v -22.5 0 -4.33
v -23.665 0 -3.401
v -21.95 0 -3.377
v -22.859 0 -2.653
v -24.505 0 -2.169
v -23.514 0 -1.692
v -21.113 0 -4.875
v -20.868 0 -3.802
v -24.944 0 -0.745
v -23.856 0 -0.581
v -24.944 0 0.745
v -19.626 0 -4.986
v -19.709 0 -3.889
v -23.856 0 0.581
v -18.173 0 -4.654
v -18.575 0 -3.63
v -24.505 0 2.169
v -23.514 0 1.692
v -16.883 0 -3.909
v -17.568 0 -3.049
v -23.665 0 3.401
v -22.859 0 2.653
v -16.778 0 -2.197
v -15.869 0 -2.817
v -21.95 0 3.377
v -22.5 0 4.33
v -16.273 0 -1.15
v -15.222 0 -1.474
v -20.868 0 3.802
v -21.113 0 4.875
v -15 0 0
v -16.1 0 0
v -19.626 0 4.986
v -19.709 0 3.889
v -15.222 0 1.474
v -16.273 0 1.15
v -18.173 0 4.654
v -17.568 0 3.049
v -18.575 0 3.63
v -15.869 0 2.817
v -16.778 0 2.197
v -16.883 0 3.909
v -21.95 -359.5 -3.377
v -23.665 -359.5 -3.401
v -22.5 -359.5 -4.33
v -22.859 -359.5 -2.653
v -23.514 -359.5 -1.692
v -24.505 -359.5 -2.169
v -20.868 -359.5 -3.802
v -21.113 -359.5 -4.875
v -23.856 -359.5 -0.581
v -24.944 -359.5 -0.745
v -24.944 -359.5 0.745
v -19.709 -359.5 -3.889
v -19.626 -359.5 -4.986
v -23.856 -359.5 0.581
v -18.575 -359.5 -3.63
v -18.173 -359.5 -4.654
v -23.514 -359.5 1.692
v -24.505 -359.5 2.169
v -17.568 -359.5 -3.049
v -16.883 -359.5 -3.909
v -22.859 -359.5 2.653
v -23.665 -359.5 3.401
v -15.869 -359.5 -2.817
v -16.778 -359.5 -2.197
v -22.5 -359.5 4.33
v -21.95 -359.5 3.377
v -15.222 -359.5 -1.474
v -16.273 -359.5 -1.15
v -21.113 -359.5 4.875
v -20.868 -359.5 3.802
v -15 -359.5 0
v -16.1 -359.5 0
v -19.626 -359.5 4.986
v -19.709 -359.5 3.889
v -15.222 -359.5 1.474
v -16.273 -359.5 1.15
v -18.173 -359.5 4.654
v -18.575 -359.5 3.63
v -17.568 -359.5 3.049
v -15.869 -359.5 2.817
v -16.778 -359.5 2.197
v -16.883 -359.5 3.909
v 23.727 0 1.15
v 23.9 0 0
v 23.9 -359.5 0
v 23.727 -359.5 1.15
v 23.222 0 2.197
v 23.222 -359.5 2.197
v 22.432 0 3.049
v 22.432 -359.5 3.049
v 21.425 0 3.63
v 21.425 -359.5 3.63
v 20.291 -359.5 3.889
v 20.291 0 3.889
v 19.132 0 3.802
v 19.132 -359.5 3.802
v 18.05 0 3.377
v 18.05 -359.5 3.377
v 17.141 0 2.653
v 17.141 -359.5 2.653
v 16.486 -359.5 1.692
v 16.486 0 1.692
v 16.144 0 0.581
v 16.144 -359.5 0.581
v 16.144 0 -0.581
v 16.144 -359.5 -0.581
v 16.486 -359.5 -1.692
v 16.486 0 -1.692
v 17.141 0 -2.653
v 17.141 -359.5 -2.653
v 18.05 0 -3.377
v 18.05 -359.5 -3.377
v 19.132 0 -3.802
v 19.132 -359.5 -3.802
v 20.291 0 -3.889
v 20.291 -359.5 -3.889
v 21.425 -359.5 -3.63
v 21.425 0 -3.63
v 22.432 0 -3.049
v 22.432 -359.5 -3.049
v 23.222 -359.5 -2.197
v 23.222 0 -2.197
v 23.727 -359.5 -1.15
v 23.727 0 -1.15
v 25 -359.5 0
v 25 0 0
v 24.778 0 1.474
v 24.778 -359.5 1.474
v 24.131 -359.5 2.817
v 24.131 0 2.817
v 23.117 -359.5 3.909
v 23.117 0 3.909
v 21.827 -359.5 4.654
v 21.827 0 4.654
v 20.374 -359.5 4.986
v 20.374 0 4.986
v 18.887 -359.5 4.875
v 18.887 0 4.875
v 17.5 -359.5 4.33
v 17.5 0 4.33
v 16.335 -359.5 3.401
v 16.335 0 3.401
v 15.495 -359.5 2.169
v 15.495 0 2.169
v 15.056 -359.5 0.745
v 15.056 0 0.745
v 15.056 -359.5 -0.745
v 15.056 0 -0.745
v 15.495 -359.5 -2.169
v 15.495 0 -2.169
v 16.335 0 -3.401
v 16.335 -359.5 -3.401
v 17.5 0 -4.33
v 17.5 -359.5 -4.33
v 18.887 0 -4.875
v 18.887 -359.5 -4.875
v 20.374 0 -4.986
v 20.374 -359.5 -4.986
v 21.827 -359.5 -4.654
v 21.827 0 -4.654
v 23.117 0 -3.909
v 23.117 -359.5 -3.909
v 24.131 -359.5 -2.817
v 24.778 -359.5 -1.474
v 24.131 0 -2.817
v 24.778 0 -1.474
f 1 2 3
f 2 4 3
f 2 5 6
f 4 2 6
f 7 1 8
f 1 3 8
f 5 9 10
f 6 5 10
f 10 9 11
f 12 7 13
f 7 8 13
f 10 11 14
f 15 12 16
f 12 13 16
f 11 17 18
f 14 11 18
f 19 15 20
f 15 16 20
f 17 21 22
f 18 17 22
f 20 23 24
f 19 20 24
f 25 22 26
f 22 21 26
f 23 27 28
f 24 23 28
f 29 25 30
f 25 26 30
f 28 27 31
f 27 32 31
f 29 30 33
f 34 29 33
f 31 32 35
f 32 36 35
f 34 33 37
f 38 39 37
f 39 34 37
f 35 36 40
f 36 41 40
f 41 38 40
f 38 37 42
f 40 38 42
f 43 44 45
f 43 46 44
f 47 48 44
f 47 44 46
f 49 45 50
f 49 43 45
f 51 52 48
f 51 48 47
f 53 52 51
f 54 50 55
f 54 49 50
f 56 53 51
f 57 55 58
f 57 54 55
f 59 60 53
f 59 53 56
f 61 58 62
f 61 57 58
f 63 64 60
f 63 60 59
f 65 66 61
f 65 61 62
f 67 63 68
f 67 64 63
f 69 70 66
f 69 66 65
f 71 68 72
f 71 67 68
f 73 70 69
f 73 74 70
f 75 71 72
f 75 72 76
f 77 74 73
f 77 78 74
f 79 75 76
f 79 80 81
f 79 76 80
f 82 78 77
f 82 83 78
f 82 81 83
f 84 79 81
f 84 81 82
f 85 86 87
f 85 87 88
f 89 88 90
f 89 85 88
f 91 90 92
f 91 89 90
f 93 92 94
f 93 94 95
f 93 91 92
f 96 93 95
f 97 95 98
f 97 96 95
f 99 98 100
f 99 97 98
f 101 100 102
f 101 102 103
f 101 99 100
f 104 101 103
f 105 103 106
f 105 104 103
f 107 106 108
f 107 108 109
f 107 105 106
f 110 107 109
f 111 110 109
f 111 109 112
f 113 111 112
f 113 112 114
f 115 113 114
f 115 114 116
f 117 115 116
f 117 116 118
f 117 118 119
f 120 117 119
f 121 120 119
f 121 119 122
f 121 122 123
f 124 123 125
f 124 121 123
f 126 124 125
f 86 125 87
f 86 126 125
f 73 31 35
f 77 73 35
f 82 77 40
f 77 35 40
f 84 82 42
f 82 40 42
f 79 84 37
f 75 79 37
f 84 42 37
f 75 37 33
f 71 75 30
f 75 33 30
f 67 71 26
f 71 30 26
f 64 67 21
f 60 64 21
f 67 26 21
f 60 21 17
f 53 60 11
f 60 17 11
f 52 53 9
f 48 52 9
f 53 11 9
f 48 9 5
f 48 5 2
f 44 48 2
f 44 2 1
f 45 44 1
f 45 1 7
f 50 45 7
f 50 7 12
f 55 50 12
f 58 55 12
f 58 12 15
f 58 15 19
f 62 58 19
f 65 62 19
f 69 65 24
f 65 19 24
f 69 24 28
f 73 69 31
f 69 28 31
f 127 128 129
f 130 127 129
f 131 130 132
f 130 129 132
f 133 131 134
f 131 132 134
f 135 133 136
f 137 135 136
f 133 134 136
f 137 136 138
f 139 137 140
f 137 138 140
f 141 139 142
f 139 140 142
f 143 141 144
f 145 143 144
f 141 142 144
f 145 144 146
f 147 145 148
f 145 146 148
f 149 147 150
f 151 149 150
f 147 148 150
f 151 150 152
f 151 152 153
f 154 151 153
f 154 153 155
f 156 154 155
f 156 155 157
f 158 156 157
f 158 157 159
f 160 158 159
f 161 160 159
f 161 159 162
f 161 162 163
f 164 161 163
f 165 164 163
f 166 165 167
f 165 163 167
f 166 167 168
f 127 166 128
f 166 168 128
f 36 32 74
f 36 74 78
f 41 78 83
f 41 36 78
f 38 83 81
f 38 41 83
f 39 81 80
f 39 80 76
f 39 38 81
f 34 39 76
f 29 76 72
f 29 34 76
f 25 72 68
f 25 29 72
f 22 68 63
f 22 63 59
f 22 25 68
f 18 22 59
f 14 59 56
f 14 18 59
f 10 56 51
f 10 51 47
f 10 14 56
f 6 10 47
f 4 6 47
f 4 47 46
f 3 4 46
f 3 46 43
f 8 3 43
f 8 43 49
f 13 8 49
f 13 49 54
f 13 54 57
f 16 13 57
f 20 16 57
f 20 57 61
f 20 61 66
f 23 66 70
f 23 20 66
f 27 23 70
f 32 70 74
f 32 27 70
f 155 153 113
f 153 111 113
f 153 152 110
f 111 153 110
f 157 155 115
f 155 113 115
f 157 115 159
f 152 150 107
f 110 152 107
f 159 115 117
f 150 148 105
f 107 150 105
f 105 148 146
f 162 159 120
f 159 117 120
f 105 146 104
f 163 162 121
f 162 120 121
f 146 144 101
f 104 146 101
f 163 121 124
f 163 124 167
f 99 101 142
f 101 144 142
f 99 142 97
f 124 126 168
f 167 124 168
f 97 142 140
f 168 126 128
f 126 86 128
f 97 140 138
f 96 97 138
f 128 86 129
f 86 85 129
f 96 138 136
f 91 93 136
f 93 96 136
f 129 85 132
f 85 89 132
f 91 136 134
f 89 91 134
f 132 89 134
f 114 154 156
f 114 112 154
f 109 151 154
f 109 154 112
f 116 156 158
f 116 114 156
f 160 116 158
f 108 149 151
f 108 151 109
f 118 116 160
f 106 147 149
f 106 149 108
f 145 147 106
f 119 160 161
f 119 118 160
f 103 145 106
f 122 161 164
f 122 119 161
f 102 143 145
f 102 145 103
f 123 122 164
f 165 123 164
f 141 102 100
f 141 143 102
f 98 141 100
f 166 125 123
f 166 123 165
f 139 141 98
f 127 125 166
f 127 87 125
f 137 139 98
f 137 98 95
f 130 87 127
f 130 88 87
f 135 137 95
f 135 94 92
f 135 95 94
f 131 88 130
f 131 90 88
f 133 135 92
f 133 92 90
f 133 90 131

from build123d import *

# Parameters (mm, degrees)
F0_R     = 5
F0_R_2   = 3.9
F1_DEPTH = 359.5


with BuildPart() as f1:
    # F0 (on Front) → F1 (new body)
    with BuildSketch(Plane.XZ):
        with Locations((-20, 0)):
            Circle(F0_R)
        with Locations((-20, 0)):
            Circle(F0_R_2, mode=Mode.SUBTRACT)
        with Locations((20, 0)):
            Circle(F0_R)
        with Locations((20, 0)):
            Circle(F0_R_2, mode=Mode.SUBTRACT)
    extrude(amount=F1_DEPTH)


solid = f1.part
